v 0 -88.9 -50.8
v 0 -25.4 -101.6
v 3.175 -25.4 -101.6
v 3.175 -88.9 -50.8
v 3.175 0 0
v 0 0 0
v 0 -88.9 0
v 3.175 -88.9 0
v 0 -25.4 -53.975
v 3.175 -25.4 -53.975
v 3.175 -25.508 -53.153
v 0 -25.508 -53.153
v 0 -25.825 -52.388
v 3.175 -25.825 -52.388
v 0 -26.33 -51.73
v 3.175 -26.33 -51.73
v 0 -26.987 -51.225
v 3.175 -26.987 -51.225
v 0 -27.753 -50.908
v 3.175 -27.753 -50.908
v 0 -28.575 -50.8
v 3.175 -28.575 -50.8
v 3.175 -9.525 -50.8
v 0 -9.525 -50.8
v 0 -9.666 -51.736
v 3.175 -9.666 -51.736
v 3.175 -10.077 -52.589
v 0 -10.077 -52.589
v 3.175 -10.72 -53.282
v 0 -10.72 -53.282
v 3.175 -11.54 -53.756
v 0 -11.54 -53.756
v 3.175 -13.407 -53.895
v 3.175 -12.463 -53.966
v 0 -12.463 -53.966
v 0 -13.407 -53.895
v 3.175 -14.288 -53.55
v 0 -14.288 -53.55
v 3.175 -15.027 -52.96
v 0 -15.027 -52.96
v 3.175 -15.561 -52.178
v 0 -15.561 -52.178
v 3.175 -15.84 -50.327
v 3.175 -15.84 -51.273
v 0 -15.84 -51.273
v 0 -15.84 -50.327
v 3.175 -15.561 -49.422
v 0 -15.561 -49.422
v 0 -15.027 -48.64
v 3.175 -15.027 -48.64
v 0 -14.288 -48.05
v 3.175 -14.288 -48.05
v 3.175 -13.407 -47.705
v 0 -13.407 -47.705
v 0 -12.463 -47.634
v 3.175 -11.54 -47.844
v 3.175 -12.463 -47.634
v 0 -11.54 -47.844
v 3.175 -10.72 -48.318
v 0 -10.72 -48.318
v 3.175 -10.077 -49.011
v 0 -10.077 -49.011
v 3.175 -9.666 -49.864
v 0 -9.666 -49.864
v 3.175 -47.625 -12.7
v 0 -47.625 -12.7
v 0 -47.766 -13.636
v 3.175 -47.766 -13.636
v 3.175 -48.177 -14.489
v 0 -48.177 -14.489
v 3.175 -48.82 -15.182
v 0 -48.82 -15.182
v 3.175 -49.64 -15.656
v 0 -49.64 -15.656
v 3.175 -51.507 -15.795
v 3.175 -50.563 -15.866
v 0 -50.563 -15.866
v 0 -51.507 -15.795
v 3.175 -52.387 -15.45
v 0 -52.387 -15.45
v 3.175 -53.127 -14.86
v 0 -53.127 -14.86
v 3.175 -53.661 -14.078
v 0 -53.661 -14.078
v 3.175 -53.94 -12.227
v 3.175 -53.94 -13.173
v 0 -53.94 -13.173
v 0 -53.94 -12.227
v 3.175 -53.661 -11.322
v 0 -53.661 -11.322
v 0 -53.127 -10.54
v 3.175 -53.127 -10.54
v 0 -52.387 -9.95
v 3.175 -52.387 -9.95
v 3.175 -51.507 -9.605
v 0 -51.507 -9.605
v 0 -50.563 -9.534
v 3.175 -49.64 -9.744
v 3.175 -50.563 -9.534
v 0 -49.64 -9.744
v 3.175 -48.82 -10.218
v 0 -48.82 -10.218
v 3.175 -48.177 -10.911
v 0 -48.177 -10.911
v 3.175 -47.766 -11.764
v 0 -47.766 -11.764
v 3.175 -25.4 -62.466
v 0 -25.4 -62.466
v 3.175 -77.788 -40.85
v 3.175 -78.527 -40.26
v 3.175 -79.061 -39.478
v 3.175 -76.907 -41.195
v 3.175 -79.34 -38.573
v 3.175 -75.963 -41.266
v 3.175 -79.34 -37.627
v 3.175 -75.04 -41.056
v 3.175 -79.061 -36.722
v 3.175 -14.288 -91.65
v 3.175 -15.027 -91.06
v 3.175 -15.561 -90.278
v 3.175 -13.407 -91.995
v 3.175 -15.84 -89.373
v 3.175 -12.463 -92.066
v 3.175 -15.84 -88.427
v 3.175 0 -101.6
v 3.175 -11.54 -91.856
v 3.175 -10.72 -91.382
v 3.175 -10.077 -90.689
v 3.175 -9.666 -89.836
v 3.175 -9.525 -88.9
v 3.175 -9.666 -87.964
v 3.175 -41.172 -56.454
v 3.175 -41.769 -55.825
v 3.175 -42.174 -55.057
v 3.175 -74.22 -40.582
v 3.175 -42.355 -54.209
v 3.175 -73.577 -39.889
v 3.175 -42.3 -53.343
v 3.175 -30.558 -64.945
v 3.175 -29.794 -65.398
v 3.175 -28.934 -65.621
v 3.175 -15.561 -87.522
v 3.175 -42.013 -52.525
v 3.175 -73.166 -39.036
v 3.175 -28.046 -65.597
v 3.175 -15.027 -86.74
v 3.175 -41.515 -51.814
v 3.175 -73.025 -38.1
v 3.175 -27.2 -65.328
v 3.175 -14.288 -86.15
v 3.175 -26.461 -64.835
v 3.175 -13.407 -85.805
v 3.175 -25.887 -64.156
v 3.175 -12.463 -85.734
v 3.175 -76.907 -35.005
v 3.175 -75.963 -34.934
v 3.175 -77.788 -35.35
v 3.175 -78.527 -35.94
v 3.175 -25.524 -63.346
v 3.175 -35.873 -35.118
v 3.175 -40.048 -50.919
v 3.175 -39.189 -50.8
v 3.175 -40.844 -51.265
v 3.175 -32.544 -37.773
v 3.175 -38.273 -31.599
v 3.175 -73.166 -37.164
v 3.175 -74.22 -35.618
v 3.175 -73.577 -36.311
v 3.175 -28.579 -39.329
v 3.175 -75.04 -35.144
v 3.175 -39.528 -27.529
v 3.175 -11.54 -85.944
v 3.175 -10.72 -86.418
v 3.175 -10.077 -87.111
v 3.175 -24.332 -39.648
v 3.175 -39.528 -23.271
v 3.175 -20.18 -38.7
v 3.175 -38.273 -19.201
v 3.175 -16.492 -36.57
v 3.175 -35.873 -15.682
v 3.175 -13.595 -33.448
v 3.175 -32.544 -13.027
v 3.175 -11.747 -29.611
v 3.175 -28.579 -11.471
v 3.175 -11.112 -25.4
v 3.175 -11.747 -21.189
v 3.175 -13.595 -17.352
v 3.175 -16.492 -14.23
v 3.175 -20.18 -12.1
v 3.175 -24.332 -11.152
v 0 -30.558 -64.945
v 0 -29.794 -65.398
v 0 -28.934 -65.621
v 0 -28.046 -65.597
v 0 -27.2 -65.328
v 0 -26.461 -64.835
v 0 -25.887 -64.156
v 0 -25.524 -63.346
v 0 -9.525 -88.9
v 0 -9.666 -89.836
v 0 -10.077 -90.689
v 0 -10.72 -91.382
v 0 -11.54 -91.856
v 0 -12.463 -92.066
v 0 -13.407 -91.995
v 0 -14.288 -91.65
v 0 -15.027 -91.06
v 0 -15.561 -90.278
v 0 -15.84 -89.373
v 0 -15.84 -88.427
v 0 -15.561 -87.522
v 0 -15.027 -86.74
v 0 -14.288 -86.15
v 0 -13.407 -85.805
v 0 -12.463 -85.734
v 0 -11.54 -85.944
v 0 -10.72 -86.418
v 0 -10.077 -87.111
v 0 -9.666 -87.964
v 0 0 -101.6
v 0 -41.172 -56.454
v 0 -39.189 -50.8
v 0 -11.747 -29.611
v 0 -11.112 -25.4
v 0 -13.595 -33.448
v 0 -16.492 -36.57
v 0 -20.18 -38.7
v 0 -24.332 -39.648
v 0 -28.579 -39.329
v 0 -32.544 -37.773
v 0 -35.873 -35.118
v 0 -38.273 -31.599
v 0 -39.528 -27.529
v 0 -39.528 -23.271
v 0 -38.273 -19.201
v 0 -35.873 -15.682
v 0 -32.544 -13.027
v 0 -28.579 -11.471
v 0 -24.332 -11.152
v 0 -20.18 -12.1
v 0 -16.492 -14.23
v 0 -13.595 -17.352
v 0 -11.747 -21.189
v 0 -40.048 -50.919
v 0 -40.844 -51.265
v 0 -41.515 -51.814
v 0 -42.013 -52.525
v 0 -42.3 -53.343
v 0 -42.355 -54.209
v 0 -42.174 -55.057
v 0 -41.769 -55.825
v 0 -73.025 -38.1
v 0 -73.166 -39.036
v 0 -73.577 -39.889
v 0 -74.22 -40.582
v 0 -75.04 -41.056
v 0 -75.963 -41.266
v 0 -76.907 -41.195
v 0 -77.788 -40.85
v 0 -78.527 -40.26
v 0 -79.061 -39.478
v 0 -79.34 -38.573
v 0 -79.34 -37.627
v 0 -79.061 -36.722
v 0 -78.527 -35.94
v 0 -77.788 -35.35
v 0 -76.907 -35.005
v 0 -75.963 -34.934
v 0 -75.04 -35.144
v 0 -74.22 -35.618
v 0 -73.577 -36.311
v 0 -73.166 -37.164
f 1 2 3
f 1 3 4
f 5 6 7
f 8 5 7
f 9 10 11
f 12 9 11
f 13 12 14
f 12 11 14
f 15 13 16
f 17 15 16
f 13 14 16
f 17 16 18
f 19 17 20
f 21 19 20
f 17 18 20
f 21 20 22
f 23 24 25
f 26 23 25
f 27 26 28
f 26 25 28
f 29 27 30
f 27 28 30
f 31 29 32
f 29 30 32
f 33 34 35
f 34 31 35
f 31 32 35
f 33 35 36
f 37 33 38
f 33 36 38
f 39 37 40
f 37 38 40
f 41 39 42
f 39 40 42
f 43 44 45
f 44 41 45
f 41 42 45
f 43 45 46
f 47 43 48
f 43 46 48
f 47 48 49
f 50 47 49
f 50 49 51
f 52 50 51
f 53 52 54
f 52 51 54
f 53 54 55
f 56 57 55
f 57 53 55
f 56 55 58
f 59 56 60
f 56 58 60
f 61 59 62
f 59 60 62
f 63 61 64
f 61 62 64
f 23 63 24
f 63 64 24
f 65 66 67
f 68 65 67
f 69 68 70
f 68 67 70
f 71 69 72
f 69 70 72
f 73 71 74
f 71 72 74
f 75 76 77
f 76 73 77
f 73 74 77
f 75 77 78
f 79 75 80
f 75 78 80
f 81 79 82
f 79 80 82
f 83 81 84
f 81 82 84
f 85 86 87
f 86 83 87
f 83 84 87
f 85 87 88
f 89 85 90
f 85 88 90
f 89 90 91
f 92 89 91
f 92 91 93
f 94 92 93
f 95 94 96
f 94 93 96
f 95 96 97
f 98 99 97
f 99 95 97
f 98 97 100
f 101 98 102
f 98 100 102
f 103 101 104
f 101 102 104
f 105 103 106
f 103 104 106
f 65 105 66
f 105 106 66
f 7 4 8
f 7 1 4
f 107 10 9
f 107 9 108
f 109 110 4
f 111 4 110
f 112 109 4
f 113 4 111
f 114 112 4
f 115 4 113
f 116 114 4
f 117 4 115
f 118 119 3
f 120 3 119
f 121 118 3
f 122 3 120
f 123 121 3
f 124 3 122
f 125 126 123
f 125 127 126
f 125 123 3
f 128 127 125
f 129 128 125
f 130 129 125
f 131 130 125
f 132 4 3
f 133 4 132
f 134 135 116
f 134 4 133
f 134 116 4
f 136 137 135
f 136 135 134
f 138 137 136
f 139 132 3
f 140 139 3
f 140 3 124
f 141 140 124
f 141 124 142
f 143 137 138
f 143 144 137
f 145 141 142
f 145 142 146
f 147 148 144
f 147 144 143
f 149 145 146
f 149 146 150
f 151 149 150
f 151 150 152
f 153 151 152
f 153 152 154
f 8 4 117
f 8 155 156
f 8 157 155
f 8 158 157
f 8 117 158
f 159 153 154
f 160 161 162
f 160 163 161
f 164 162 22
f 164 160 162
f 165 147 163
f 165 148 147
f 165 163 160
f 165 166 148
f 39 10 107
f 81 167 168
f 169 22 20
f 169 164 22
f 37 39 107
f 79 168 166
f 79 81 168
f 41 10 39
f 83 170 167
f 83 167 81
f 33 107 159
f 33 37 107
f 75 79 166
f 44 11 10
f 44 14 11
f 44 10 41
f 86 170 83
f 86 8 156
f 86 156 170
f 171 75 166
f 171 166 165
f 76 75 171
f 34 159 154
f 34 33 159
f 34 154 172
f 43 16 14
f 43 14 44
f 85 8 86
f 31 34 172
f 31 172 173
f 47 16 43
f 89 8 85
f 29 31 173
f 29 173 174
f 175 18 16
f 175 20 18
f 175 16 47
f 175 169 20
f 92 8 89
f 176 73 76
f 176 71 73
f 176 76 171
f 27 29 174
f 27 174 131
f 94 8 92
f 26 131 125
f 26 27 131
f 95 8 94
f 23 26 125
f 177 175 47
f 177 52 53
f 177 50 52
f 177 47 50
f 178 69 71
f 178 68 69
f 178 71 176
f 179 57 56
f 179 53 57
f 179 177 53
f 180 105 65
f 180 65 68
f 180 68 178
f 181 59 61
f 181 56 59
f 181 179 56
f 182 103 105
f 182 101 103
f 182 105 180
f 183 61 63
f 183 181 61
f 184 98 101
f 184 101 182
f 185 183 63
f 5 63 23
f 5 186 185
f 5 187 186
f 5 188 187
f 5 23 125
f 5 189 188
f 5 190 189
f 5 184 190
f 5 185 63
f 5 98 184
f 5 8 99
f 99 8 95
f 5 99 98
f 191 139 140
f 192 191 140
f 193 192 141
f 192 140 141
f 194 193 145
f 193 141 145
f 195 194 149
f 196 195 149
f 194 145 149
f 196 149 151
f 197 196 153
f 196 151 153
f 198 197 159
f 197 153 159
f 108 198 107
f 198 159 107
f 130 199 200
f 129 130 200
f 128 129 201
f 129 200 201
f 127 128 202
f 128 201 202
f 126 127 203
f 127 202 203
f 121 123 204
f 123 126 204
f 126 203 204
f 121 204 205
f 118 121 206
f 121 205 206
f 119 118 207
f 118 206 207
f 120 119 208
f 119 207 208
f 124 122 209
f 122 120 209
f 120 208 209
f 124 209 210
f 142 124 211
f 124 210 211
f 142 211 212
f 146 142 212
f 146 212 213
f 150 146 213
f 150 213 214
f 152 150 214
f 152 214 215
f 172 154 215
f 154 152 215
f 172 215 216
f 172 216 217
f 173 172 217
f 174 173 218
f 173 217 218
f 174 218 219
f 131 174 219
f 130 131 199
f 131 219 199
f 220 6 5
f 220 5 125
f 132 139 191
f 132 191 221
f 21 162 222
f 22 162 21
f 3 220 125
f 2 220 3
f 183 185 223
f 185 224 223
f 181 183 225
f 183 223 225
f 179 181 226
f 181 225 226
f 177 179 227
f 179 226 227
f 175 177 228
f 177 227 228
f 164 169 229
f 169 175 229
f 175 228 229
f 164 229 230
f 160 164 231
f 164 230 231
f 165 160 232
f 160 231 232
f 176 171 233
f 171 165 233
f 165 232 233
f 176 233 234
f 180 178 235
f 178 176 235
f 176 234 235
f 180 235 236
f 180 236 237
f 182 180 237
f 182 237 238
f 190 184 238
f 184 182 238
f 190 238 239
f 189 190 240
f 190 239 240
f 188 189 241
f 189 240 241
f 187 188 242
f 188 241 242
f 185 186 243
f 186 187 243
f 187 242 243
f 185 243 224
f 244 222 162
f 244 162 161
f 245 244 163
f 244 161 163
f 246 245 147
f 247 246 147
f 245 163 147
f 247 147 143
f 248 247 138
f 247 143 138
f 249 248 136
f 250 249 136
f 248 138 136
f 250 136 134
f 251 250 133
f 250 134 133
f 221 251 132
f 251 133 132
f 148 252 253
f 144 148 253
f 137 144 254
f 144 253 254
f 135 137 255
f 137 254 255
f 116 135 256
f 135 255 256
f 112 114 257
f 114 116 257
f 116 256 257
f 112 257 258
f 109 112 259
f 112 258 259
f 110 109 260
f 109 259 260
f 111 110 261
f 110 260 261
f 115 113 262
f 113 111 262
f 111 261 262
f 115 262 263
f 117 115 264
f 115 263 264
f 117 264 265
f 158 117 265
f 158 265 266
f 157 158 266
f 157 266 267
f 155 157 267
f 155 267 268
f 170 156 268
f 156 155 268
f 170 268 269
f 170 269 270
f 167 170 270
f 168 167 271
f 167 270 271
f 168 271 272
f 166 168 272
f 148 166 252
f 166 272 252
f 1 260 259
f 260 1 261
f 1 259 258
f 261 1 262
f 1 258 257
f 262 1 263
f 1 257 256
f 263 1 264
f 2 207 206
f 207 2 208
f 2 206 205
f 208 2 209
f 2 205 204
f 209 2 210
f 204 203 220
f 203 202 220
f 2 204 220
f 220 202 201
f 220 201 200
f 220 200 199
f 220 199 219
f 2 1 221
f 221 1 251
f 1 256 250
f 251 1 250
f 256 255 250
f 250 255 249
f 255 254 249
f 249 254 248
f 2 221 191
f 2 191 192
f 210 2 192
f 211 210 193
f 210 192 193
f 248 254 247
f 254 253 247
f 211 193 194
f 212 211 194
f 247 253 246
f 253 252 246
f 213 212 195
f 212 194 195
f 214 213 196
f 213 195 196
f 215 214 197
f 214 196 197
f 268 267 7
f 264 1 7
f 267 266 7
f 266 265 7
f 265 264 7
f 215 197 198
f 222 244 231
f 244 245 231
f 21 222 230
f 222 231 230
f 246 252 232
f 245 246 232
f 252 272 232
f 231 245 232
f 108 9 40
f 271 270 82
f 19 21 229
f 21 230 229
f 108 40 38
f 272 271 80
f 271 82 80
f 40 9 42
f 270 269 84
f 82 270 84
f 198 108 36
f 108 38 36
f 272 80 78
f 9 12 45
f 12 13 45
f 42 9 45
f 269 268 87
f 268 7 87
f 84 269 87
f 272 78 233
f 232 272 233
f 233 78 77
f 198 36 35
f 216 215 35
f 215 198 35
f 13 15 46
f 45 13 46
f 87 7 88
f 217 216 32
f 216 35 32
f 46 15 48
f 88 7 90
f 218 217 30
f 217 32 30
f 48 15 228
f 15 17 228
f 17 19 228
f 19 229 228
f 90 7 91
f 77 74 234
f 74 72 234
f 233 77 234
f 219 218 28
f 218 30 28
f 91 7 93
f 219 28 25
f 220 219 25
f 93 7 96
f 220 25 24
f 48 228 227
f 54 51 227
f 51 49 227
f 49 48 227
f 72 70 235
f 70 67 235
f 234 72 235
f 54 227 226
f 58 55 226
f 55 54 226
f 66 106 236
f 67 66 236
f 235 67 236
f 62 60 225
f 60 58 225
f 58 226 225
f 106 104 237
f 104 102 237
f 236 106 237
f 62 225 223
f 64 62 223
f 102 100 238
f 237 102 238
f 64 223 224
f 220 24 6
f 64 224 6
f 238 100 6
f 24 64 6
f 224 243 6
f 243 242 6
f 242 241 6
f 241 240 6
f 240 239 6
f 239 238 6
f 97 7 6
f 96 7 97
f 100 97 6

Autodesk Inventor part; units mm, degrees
ref_plane "YZ Plane" through (0, 0, 0) normal (1, 0, 0) x (0, 1, 0)
ref_plane "XZ Plane" through (0, 0, 0) normal (0, 1, 0) x (-1, 0, 0)
ref_plane "XY Plane" through (0, 0, 0) normal (0, 0, 1) x (1, 0, 0)
sketch "Sketch1" plane through (0, 0, 0) normal (1, 0, 0) x (0, 1, 0)
  line L0 (0, 0) -> (0, -101.6)
  line L1 (0, -101.6) -> (-25.4, -101.6)
  line L2 (-25.4, -101.6) -> (-88.9, -50.8)
  line L3 (-88.9, -50.8) -> (-88.9, 0)
  circle A0 centre (-50.8, -12.7) radius 3.175
  circle A1 centre (-12.7, -50.8) radius 3.175
  circle A2 centre (-12.7, -88.9) radius 3.175
  line L4 (-12.7, -25.4) -> (-12.7, -101.6) construction
  line L5 (0, -12.7) -> (-88.9, -12.7) construction
  circle A3 centre (-76.2, -38.1) radius 3.175
  circle A4 centre (-25.4, -25.4) radius 14.2875
  line L6 (0, 0) -> (-88.9, 0)
  dimension "d0" = 50.8
  dimension "d1" = 25.4
  dimension "d2" = 88.9
  dimension "d3" = 101.6
  dimension "d5" = 38.1
  dimension "d6" = 12.7
  dimension "d10" = 12.7
  dimension "d11" = 12.7
  dimension "d13" = 28.575
  dimension "d15" = 6.35
  dimension "d24" = 90
  dimension "d25" = 12.7
  dimension "d26" = 25.4
  dimension "d27" = 76.2
  dimension "d29" = 63.5
  dimension "d30" = 6.35
  dimension "d31" = 50.8
  dimension "d32" = 38.1
extrude "Extrusion1" add sketch "Sketch1" along normal blind 3.175
sketch "Sketch2" plane through (3.175, 0, 0) normal (1, 0, 0) x (0, 0, -1)
  line L0 (50.8, -39.1889) -> (50.8, -28.575)
  line L1 (53.975, -25.4) -> (62.4661, -25.4)
  line L2 (64.9454, -30.5584) -> (56.4543, -41.1723)
  line L3 (101.6, 0) -> (0, 0) projected
  line L4 (0, 0) -> (0, -101.6) projected
  line L5 (50.8, -88.9) -> (101.6, -25.4) projected
  arc A0 (50.8, -39.1889) -> (56.4543, -41.1723) centre (53.975, -39.1889) ccw
  arc A1 (53.975, -25.4) -> (50.8, -28.575) centre (53.975, -28.575) ccw
  arc A2 (64.9454, -30.5584) -> (62.4661, -25.4) centre (62.4661, -28.575) ccw
  line L6 (0, 0) -> (0, -88.9) projected
  dimension "d18" = 25.4
  dimension "d19" = 25.4
  dimension "d21" = 3.175
  dimension "d28" = 50.8
extrude "Extrusion2" cut sketch "Sketch2" against normal blind 3.175
properties part number "15102898-16-P-0205_CPY" material "Aluminum 6061"
